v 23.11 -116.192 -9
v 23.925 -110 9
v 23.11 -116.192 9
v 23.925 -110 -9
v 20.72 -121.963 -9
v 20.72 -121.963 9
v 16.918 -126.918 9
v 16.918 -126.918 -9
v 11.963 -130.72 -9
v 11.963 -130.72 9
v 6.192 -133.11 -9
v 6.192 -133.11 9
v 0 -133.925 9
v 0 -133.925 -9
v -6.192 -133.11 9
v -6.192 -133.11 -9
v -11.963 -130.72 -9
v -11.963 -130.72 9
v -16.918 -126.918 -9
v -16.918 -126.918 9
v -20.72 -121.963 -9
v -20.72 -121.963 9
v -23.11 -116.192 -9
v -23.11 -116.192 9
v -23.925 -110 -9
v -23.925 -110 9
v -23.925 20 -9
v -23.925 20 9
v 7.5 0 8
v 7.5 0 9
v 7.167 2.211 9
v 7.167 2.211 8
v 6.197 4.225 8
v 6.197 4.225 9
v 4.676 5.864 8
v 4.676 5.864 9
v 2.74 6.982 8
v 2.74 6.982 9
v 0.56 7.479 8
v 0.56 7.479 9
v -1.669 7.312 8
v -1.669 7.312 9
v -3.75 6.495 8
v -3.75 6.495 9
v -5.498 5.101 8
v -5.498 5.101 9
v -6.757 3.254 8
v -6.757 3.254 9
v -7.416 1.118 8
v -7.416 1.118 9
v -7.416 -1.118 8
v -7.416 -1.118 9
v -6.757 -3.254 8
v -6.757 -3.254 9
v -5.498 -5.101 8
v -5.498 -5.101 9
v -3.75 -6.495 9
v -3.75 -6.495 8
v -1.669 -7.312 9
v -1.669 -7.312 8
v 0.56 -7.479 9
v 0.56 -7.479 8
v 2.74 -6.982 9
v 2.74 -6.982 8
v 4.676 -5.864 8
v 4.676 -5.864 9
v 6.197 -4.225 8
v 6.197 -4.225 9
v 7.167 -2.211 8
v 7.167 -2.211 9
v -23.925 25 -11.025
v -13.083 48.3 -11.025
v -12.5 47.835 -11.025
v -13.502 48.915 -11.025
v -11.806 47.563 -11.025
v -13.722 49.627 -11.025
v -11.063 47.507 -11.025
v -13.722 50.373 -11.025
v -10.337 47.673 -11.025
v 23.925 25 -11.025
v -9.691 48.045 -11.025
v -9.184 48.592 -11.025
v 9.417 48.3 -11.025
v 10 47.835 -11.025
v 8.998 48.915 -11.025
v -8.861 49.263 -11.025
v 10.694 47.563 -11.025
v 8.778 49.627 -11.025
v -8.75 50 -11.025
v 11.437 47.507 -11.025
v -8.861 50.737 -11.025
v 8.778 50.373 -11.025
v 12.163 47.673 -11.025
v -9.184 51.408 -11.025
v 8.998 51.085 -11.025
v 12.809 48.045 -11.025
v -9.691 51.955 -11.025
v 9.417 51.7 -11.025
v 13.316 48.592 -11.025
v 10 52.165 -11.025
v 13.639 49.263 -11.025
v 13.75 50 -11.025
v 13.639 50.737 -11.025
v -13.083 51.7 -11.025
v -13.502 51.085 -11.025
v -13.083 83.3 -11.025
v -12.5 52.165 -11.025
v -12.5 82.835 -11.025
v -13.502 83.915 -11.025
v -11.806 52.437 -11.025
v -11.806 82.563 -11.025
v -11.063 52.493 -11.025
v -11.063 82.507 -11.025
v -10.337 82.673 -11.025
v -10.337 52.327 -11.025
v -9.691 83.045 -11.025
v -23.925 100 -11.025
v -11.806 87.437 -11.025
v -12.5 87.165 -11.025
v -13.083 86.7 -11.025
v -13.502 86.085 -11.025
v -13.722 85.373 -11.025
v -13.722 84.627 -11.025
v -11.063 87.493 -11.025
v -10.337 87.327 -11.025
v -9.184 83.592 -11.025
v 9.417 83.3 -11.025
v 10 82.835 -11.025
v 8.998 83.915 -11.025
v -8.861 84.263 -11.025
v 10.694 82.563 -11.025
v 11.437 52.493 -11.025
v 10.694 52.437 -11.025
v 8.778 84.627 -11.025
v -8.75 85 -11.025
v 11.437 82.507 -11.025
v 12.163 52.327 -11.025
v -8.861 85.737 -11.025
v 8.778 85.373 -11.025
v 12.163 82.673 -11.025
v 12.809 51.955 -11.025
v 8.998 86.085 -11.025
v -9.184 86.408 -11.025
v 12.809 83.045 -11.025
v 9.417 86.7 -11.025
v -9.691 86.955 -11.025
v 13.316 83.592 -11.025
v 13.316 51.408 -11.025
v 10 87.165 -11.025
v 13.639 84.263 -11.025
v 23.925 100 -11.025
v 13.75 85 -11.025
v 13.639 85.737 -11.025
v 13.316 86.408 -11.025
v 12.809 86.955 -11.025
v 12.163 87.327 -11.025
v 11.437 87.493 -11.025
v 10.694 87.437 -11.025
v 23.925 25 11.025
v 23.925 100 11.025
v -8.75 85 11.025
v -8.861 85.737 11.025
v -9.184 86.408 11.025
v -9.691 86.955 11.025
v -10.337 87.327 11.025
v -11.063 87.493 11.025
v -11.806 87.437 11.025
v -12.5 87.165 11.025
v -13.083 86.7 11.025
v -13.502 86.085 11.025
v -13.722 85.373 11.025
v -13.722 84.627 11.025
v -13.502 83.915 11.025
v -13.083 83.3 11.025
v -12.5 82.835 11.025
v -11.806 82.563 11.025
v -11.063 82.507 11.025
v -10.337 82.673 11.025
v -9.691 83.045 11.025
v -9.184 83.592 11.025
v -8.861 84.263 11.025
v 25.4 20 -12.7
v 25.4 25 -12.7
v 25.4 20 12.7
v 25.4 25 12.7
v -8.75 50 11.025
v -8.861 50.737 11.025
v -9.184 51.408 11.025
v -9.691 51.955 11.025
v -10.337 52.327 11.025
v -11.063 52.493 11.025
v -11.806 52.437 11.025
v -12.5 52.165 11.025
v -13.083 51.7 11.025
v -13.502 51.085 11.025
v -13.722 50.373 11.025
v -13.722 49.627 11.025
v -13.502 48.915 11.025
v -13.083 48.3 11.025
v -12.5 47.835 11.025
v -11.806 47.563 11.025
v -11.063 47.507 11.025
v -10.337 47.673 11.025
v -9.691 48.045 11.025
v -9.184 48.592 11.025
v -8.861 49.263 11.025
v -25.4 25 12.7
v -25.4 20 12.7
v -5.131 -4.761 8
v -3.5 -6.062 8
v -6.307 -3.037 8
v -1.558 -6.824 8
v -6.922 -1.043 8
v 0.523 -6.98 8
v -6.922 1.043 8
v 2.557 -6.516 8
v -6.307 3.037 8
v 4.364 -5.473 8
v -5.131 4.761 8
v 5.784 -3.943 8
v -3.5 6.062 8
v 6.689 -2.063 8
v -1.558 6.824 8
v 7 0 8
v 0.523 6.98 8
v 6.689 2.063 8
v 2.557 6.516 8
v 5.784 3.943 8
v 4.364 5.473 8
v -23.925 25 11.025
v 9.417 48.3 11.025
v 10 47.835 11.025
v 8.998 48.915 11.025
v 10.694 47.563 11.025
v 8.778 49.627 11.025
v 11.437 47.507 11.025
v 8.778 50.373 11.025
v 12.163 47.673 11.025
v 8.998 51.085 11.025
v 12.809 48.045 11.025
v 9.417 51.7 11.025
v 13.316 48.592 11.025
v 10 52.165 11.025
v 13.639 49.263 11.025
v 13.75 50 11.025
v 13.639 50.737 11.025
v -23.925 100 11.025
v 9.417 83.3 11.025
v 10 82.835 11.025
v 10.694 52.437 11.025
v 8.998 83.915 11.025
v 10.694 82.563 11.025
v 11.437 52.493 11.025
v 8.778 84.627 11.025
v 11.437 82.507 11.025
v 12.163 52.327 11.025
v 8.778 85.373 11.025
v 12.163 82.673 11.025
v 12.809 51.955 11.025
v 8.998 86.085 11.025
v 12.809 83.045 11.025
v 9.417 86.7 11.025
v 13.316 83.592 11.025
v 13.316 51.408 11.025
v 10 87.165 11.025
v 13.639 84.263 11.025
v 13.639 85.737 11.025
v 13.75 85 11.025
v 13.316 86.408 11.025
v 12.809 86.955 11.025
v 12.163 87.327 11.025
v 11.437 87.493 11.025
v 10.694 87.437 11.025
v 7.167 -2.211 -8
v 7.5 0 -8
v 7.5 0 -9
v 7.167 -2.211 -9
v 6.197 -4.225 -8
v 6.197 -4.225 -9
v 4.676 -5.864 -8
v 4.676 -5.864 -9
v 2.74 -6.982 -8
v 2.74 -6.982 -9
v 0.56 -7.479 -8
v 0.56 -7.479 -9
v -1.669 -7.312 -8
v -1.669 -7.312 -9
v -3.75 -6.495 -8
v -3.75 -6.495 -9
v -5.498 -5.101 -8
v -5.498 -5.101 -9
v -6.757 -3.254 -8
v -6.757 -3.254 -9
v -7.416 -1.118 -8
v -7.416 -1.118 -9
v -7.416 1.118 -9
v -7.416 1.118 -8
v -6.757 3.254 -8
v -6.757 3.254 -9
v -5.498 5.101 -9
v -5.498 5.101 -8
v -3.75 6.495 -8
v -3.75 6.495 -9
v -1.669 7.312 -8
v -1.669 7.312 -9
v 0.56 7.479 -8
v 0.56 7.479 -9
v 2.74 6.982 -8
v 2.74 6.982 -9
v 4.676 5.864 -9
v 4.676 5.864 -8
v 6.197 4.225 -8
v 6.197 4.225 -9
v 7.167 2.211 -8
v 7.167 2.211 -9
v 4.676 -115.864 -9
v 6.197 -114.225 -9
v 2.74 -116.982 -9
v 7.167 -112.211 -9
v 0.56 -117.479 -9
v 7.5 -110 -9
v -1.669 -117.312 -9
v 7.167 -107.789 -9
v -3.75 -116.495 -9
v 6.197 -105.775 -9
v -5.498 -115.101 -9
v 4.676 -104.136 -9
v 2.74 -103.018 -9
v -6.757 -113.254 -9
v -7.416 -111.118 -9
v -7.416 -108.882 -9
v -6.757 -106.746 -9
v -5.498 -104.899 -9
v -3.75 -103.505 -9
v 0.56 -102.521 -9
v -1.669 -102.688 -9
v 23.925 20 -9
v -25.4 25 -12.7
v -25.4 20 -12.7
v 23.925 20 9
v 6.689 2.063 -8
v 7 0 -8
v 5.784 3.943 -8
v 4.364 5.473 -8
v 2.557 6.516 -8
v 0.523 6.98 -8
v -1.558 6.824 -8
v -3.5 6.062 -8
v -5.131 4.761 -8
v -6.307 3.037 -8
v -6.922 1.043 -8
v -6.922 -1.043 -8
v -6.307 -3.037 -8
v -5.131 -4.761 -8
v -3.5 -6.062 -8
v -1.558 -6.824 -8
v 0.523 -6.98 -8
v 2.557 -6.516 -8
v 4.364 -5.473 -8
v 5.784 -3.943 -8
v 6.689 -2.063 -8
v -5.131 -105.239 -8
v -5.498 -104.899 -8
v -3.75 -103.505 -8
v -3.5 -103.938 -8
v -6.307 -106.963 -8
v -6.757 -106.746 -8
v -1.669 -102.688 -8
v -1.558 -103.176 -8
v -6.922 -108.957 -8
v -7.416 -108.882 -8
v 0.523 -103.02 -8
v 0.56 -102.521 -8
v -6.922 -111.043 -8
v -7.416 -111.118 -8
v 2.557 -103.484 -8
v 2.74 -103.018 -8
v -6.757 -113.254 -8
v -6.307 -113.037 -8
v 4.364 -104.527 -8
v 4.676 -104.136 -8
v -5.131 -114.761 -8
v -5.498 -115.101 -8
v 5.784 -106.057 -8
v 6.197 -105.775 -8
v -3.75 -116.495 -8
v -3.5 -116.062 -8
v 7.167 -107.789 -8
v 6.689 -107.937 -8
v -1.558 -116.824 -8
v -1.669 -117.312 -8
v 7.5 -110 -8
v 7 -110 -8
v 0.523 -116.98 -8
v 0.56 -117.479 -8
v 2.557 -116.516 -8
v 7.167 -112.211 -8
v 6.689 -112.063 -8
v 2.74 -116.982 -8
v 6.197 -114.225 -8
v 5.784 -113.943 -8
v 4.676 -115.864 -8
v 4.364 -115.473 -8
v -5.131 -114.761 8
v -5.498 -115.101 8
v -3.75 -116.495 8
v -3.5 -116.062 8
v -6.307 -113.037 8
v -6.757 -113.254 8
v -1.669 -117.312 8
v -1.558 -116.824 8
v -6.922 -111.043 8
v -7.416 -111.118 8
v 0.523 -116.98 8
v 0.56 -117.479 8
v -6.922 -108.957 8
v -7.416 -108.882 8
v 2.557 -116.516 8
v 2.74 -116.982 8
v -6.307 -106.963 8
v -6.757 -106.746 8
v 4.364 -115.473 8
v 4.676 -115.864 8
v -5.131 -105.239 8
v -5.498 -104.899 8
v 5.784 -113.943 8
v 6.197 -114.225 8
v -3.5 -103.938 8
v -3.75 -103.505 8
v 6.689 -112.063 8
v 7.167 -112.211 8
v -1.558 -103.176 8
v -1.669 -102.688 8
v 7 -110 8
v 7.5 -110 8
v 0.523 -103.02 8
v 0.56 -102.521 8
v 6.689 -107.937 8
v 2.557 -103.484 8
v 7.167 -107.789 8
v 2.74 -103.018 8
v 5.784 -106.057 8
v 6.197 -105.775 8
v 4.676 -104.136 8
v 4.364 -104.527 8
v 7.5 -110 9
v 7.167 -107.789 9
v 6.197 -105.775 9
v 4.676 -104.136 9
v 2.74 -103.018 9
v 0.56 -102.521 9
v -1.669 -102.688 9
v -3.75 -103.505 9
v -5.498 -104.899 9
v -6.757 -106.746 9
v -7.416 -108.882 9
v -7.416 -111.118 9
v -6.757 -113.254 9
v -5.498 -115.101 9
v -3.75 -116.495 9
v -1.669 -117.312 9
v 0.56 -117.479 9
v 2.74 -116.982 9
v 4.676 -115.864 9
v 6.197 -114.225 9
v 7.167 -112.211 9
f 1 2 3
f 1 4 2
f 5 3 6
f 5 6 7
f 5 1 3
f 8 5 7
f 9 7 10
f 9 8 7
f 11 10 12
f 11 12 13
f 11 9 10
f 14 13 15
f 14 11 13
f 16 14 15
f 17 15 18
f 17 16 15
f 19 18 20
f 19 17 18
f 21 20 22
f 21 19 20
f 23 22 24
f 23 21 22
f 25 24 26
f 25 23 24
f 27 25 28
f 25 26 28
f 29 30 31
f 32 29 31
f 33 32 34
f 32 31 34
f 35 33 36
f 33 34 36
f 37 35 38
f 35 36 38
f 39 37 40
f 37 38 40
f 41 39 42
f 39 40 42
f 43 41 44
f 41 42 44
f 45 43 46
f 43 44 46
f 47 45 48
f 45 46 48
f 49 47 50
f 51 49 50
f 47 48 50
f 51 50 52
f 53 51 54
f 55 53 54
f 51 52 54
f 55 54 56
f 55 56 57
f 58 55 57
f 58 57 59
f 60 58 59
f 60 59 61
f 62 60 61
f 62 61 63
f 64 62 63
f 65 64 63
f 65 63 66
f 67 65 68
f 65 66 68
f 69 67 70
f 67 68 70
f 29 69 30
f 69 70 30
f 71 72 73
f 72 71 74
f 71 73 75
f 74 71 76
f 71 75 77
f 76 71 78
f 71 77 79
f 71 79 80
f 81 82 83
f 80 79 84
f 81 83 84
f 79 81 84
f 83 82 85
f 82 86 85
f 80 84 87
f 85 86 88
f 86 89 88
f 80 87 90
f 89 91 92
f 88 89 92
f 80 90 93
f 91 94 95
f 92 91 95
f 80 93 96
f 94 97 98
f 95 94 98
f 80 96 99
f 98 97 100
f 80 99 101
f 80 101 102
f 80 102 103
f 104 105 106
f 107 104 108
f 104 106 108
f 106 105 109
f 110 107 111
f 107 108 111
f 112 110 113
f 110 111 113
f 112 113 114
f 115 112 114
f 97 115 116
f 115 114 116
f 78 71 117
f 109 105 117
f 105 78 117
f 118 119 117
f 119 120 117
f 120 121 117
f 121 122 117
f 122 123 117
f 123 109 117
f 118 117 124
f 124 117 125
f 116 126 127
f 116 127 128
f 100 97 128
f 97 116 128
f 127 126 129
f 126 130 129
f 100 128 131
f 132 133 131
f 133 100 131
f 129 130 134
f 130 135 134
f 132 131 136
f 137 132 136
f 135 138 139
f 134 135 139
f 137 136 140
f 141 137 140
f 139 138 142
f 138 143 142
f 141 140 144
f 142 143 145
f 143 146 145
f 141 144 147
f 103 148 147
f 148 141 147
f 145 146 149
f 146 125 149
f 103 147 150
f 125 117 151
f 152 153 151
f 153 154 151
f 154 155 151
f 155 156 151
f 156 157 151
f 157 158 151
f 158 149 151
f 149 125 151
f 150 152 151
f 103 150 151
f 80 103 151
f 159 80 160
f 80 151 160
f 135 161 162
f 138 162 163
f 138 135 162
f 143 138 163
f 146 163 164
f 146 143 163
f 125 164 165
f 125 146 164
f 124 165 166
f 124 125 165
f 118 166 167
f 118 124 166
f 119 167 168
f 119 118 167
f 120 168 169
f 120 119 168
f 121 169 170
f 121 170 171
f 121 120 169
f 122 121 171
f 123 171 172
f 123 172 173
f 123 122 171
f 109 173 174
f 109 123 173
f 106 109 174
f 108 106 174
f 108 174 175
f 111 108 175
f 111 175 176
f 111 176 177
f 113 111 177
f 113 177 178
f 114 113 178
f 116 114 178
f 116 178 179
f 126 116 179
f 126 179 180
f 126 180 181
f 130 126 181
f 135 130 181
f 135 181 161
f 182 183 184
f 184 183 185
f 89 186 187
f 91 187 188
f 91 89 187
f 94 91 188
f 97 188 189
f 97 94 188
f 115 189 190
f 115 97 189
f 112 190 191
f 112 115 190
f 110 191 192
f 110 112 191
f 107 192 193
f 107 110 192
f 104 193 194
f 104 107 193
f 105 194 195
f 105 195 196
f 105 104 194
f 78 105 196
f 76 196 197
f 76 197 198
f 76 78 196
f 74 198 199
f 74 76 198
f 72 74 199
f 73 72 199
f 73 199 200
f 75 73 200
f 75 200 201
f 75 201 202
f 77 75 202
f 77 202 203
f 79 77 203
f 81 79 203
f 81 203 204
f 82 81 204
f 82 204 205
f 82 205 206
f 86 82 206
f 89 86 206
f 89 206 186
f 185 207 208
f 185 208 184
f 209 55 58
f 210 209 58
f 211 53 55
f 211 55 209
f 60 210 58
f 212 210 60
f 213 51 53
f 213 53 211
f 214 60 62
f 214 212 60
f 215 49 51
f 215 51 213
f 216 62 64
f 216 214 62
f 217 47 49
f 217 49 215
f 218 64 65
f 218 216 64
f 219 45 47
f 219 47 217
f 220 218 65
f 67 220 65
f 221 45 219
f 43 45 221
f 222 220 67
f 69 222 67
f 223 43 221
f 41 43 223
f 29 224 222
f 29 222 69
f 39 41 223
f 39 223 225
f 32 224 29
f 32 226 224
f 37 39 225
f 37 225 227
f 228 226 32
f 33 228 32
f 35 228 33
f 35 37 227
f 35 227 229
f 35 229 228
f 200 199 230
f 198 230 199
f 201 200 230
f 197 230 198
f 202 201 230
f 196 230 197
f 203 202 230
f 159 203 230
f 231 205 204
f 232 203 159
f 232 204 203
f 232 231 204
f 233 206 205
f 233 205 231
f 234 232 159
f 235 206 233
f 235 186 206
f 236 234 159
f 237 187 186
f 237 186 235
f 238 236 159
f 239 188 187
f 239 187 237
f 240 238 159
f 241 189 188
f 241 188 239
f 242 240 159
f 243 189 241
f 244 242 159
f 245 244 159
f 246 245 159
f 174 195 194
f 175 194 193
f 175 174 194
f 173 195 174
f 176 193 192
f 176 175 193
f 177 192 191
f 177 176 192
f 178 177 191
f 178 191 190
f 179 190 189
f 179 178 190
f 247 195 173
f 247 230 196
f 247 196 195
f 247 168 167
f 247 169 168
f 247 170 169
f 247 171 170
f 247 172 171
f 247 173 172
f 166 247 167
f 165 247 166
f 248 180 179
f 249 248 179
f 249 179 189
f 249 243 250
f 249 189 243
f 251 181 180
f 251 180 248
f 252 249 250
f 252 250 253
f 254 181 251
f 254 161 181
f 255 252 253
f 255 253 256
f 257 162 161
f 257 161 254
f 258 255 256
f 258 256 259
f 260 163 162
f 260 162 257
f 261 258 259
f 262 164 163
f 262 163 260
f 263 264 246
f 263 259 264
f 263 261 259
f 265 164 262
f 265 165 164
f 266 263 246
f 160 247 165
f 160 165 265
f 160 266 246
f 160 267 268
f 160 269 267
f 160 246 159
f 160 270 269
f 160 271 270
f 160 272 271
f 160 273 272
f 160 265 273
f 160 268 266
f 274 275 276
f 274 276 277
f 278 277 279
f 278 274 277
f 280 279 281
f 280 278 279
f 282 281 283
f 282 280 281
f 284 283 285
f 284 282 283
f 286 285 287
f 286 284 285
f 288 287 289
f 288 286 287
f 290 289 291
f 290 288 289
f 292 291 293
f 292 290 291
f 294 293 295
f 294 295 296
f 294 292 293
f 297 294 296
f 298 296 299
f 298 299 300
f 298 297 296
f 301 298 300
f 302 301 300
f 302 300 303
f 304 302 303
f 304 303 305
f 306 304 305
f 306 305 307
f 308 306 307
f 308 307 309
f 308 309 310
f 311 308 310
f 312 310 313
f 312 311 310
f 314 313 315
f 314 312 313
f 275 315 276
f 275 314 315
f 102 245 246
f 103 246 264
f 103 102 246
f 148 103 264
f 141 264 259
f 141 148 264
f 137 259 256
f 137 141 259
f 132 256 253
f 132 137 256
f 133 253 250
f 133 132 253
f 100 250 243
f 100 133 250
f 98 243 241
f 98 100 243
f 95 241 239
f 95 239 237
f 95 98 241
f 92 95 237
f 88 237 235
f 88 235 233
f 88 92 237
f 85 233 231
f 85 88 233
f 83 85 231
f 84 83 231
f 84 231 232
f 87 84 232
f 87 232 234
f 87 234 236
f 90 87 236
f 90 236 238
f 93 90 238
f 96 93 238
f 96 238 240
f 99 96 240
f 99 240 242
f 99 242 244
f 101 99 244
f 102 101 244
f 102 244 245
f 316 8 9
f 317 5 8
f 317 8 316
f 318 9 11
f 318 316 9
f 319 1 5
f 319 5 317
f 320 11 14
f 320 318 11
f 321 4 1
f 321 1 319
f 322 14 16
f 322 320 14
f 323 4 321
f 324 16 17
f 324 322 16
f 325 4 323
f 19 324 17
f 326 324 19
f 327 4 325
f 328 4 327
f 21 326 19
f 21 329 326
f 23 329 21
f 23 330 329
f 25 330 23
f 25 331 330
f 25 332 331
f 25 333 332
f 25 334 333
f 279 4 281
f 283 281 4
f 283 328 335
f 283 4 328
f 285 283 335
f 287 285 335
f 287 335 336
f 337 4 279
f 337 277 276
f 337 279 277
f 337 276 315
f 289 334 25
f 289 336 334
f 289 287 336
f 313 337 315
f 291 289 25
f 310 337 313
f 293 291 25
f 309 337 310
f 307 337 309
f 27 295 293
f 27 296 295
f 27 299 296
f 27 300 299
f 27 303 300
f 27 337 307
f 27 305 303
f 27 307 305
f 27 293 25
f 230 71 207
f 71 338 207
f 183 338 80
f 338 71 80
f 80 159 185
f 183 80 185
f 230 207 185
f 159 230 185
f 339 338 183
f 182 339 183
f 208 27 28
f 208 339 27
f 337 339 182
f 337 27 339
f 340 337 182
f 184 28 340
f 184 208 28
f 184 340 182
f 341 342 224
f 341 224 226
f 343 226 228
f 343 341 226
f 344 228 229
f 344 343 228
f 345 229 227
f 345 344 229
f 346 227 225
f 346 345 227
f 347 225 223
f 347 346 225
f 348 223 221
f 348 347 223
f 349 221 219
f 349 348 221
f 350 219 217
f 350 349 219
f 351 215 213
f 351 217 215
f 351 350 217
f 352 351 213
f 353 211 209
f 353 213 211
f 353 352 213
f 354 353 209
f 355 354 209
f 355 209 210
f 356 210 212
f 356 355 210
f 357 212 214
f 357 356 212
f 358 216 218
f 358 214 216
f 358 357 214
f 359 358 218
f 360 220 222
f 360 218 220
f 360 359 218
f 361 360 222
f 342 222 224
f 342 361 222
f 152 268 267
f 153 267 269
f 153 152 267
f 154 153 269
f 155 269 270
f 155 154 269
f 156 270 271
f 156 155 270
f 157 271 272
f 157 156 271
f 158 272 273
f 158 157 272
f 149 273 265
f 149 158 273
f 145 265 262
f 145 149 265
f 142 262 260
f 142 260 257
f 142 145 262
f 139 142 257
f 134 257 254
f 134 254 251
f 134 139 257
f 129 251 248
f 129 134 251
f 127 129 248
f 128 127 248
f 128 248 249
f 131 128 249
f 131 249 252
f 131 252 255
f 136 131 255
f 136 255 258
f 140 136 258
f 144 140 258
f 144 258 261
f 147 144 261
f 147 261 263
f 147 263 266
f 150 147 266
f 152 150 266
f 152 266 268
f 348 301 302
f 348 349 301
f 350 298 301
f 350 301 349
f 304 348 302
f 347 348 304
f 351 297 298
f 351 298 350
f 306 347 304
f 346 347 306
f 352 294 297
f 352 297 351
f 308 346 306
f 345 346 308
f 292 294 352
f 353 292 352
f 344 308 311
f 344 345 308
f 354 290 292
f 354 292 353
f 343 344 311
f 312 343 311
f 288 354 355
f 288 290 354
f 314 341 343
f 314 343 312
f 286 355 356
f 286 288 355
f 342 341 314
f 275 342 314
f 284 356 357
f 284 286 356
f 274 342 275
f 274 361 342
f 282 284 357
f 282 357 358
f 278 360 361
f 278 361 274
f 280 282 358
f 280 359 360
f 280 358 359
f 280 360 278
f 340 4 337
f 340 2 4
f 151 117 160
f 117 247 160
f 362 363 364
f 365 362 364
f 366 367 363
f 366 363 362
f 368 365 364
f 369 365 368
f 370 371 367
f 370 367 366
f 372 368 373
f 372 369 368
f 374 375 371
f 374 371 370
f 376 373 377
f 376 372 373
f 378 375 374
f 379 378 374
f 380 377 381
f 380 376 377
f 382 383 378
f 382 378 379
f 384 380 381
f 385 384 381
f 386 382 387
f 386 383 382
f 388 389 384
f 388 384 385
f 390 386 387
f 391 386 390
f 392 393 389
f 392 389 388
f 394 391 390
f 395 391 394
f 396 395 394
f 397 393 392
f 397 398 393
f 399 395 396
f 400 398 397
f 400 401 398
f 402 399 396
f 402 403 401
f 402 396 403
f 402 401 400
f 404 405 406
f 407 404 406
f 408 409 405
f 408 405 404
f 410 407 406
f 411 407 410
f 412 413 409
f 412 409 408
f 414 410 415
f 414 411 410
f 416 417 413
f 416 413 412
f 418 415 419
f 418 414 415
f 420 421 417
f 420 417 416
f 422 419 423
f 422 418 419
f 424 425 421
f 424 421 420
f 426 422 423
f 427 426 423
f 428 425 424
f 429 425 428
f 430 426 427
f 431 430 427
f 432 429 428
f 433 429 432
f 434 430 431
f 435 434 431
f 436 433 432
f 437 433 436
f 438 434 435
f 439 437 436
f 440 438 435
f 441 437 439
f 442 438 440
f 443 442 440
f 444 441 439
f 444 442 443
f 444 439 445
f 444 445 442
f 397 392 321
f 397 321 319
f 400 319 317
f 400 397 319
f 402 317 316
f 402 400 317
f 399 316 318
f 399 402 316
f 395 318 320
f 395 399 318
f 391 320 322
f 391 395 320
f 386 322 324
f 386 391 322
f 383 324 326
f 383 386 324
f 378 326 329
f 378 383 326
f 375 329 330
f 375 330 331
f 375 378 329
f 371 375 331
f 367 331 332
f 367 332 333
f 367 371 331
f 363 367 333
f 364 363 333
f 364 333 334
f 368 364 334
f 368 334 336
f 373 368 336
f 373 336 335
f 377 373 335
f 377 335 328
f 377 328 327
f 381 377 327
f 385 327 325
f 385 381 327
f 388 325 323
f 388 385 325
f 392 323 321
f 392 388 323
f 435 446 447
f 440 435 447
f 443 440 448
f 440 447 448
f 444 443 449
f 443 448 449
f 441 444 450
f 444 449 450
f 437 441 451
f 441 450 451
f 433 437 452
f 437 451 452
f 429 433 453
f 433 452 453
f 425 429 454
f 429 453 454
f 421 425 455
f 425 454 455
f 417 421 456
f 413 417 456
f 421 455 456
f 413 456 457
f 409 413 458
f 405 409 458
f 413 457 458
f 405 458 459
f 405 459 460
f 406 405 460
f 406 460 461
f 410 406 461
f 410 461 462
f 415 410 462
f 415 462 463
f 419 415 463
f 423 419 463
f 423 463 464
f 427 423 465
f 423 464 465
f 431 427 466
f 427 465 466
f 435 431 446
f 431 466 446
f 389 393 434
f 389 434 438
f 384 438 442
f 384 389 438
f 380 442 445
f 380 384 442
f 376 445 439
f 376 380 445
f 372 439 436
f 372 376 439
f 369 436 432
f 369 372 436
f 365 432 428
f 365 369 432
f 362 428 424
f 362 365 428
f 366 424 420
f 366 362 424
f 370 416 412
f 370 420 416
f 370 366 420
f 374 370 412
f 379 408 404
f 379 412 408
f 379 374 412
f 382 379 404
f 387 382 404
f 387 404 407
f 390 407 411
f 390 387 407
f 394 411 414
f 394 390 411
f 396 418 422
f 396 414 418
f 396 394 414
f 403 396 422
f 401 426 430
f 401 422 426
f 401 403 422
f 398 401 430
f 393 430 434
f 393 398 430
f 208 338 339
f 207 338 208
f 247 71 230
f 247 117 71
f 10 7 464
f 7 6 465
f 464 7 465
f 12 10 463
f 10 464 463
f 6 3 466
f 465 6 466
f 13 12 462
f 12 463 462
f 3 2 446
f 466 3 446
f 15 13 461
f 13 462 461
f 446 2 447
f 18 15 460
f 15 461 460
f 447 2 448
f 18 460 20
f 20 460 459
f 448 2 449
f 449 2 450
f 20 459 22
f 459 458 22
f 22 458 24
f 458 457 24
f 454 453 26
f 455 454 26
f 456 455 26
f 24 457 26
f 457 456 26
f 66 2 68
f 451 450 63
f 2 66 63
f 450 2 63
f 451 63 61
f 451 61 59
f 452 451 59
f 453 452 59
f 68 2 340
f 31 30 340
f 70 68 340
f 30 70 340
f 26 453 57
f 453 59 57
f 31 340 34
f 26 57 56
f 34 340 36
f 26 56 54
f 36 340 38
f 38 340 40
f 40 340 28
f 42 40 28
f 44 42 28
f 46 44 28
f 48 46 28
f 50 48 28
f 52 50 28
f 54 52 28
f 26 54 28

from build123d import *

# Parameters (mm, degrees)
SKETCH1_R           = 7
SKETCH1_R_2         = 2.5
BOSS_EXTRUDE1_DEPTH = 9
SKETCH3_W           = 47.85
SKETCH3_H           = 65
SKETCH3_R           = 2.5
BOSS_EXTRUDE2_DEPTH = 11.025
SKETCH4_R           = 7.5
CUT_EXTRUDE1_DEPTH  = 1
CUT_EXTRUDE2_START  = -1
SKETCH5_R           = 7.5
CUT_EXTRUDE2_DEPTH  = 1
SKETCH6_R           = 7.5
CUT_EXTRUDE3_DEPTH  = 1
CUT_EXTRUDE4_START  = -1
SKETCH7_R           = 7.5
CUT_EXTRUDE4_DEPTH  = 1
BOSS_EXTRUDE3_START = 10
SKETCH8_W           = 50.8
SKETCH8_H           = 25.4
BOSS_EXTRUDE3_DEPTH = 5
SKETCH9_W           = 47.85
SKETCH9_H           = 22.05
BOSS_EXTRUDE4_DEPTH = 10


with BuildPart() as part:
    # Sketch1 → Boss-Extrude1 (new, symmetric)
    with BuildSketch(Plane.XY):
        with BuildLine():
            Line((-23.925, 0), (-23.925, 100))
            Line((-23.925, 100), (23.925, 100))
            Line((23.925, 100), (23.925, 0))
            Line((23.925, 0), (23.925, -110))
            ThreePointArc((23.925, -110), (16.91752974, -126.91752974), (0, -133.925))
            ThreePointArc((0, -133.925), (-16.91752974, -126.91752974), (-23.925, -110))
            Line((-23.925, -110), (-23.925, 0))
        make_face()
        Circle(SKETCH1_R, mode=Mode.SUBTRACT)
        with Locations((-11.25, 85)):
            Circle(SKETCH1_R_2, mode=Mode.SUBTRACT)
        with Locations((11.25, 85)):
            Circle(SKETCH1_R_2, mode=Mode.SUBTRACT)
        with Locations((11.25, 50)):
            Circle(SKETCH1_R_2, mode=Mode.SUBTRACT)
        with Locations((-11.25, 50)):
            Circle(SKETCH1_R_2, mode=Mode.SUBTRACT)
        with Locations((0, -110)):
            Circle(SKETCH1_R, mode=Mode.SUBTRACT)
    extrude(amount=BOSS_EXTRUDE1_DEPTH, both=True)

    # Sketch3 → Boss-Extrude2 (add, symmetric)
    with BuildSketch(Plane.XY):
        with Locations((0, 67.5)):
            Rectangle(SKETCH3_W, SKETCH3_H)
        with Locations((-11.25, 50)):
            Circle(SKETCH3_R, mode=Mode.SUBTRACT)
        with Locations((11.25, 50)):
            Circle(SKETCH3_R, mode=Mode.SUBTRACT)
        with Locations((11.25, 85)):
            Circle(SKETCH3_R, mode=Mode.SUBTRACT)
        with Locations((-11.25, 85)):
            Circle(SKETCH3_R, mode=Mode.SUBTRACT)
    extrude(amount=BOSS_EXTRUDE2_DEPTH, both=True)

    # Sketch4 → Cut-Extrude1 (cut)
    with BuildSketch(Plane.XY.offset(9)):
        with Locations((0, -110)):
            Circle(SKETCH4_R)
    extrude(amount=-CUT_EXTRUDE1_DEPTH, mode=Mode.SUBTRACT)

    # Sketch5 → Cut-Extrude2 (cut)
    with BuildSketch(Plane(origin=(0, 0, -9), x_dir=(-1, 0, 0), z_dir=(0, 0, -1)).offset(CUT_EXTRUDE2_START)):
        with Locations(Location((0, -110, 0), (0, 0, 180))):
            Circle(SKETCH5_R)
    extrude(amount=CUT_EXTRUDE2_DEPTH, mode=Mode.SUBTRACT)

    # Sketch6 → Cut-Extrude3 (cut)
    with BuildSketch(Plane.XY.offset(9)):
        Circle(SKETCH6_R)
    extrude(amount=-CUT_EXTRUDE3_DEPTH, mode=Mode.SUBTRACT)

    # Sketch7 → Cut-Extrude4 (cut)
    with BuildSketch(Plane(origin=(0, 0, -9), x_dir=(-1, 0, 0), z_dir=(0, 0, -1)).offset(CUT_EXTRUDE4_START)):
        with Locations(Location((0, 0, 0), (0, 0, 180))):
            Circle(SKETCH7_R)
    extrude(amount=CUT_EXTRUDE4_DEPTH, mode=Mode.SUBTRACT)

    # Sketch8 → Boss-Extrude3 (add)
    with BuildSketch(Plane.XZ.offset(-35).offset(BOSS_EXTRUDE3_START)):
        Rectangle(SKETCH8_W, SKETCH8_H)
    extrude(amount=BOSS_EXTRUDE3_DEPTH)

    # Sketch9 → Boss-Extrude4 (add)
    with BuildSketch(Plane.XZ.offset(-35)):
        Rectangle(SKETCH9_W, SKETCH9_H)
    extrude(amount=BOSS_EXTRUDE4_DEPTH)


solid = part.part
